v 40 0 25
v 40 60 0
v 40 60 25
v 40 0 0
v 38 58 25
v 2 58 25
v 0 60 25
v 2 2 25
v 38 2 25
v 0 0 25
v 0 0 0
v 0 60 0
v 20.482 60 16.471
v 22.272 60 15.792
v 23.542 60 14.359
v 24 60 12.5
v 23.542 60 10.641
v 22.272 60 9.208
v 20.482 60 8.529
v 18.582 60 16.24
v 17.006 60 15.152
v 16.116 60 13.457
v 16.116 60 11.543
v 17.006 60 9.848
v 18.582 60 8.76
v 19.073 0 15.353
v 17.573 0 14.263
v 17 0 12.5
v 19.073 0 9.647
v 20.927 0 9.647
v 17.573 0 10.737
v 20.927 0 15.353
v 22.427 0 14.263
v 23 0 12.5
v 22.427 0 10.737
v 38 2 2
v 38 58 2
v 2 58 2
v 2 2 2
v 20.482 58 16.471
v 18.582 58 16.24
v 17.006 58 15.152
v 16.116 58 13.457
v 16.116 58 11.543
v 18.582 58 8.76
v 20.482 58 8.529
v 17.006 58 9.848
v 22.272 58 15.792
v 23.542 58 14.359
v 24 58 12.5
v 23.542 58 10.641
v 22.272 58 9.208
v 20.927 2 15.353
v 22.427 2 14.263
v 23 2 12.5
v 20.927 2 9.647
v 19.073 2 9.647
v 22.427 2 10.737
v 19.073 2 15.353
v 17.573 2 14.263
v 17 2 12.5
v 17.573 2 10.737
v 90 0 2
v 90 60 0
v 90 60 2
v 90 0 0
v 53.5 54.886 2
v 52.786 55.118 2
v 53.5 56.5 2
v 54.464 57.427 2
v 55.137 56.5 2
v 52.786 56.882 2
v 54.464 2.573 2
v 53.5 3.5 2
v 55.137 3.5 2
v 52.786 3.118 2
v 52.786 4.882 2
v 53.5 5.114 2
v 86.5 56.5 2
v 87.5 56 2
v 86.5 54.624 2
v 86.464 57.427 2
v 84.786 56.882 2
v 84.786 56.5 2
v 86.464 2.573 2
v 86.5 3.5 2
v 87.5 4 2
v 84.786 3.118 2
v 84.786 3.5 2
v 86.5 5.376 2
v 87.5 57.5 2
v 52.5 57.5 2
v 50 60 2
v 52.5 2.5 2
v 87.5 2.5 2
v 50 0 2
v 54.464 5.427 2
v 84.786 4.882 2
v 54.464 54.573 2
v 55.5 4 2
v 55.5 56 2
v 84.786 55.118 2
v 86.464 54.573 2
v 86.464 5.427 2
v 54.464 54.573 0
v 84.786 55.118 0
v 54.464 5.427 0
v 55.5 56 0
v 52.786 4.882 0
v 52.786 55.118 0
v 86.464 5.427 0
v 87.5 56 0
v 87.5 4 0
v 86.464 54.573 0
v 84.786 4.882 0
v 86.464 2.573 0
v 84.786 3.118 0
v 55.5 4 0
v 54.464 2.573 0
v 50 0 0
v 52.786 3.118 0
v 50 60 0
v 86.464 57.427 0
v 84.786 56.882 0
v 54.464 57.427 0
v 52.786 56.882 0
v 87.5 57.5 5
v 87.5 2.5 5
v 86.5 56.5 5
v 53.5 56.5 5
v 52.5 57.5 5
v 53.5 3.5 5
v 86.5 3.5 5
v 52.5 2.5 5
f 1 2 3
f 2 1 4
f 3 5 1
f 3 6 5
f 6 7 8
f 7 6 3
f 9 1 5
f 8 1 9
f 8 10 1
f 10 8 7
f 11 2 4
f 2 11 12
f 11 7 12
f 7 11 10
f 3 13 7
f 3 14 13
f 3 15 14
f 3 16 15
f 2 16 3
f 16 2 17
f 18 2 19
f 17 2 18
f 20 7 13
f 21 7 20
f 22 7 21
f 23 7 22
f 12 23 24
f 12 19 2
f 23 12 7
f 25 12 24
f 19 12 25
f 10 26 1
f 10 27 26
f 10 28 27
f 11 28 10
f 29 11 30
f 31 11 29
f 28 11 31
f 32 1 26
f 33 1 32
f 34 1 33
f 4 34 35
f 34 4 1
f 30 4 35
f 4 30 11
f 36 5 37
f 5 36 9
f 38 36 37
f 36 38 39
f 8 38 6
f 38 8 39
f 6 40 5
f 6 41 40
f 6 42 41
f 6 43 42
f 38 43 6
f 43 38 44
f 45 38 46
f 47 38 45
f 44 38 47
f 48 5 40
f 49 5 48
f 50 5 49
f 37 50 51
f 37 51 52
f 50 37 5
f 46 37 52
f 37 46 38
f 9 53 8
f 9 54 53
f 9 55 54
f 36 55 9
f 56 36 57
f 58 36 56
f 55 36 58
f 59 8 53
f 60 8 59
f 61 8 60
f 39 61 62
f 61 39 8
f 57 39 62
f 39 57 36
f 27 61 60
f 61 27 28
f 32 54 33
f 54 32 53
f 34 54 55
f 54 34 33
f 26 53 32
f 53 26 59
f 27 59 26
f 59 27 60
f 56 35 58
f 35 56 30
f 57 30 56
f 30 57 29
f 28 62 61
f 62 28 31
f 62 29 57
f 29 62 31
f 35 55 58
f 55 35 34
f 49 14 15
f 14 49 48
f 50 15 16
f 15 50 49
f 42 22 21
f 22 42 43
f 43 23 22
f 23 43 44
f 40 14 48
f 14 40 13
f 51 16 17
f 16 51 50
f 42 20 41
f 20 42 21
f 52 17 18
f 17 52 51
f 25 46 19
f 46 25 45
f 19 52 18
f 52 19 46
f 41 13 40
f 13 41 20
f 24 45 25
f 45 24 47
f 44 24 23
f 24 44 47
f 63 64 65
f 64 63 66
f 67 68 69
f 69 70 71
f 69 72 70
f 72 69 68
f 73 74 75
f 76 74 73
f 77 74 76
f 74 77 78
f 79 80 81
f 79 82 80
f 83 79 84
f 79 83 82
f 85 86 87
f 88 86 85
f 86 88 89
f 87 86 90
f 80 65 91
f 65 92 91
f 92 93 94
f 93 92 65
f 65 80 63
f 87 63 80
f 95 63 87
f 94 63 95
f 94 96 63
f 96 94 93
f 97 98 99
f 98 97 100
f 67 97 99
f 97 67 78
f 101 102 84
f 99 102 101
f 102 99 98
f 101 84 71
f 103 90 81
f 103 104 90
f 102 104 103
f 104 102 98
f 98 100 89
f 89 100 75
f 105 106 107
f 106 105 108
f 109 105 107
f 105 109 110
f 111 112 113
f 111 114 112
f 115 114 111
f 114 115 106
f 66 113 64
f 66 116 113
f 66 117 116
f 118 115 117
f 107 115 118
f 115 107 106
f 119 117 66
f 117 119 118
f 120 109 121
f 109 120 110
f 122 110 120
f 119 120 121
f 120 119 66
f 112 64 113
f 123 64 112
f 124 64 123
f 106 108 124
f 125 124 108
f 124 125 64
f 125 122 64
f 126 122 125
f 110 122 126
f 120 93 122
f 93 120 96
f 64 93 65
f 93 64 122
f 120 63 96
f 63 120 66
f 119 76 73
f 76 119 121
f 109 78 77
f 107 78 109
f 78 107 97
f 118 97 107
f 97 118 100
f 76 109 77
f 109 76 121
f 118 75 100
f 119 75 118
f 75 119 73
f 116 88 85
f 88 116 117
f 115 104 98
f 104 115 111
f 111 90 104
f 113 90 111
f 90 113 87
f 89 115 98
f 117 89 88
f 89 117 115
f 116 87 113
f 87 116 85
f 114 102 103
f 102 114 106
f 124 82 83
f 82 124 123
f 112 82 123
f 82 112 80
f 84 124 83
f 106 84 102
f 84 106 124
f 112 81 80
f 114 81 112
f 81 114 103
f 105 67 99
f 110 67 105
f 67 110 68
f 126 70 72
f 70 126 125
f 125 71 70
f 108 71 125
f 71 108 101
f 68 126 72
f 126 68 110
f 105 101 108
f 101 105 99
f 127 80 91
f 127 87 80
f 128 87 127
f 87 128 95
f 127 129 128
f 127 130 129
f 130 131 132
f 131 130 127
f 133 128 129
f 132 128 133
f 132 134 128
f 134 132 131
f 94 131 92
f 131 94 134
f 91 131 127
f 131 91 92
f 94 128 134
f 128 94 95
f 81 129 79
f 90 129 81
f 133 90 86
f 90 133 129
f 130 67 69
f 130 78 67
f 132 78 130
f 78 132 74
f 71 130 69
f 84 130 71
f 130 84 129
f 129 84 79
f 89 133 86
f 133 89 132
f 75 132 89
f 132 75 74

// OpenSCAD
/*
  Digital Synesthesia: The Oscilloscope Case (SCAD)
  
  Role: The Geometry (Container for the Biologist's Mind).
  Fits: Arduino Nano + 0.96" OLED Display.
  
  Instructions:
  1. Install OpenSCAD.
  2. Open this file.
  3. Render (F6) -> Export as STL.
  4. 3D Print.
*/

// Dimensions (mm)
width = 40;
length = 60;
height = 25;
wall = 2;

// OLED Cutout (0.96" I2C)
oled_w = 27;
oled_h = 15;
oled_x = (width - oled_w) / 2;
oled_y = 10;

// Main Box
difference() {
    // Outer Shell
    cube([width, length, height]);
    
    // Inner Cavity
    translate([wall, wall, wall])
        cube([width - 2*wall, length - 2*wall, height]);
        
    // OLED Cutout (Top Face)
    translate([oled_x, length - oled_y - oled_h, height - wall - 1])
        cube([oled_w, oled_h, wall + 2]);
        
    // Probe Hole (Front Face)
    translate([width/2, 0, height/2])
        rotate([90, 0, 0])
        cylinder(h=wall+2, r=3, center=true); // 6mm hole for wires
        
    // USB Hole (Back Face)
    translate([width/2, length, height/2])
        rotate([90, 0, 0])
        cylinder(h=wall+2, r=4, center=true); // 8mm hole for USB
}

// Lid (Separate Piece)
translate([width + 10, 0, 0]) {
    difference() {
        cube([width, length, 2]); // Lid plate
        
        // Screw holes (optional)
        translate([4, 4, -1]) cylinder(h=4, r=1.5);
        translate([width-4, 4, -1]) cylinder(h=4, r=1.5);
        translate([width-4, length-4, -1]) cylinder(h=4, r=1.5);
        translate([4, length-4, -1]) cylinder(h=4, r=1.5);
    }
    
    // Snap-fit lip
    translate([wall+0.5, wall+0.5, 2])
        difference() {
            cube([width - 2*wall - 1, length - 2*wall - 1, 3]);
            translate([1, 1, -1])
                cube([width - 2*wall - 3, length - 2*wall - 3, 5]);
        }
}
